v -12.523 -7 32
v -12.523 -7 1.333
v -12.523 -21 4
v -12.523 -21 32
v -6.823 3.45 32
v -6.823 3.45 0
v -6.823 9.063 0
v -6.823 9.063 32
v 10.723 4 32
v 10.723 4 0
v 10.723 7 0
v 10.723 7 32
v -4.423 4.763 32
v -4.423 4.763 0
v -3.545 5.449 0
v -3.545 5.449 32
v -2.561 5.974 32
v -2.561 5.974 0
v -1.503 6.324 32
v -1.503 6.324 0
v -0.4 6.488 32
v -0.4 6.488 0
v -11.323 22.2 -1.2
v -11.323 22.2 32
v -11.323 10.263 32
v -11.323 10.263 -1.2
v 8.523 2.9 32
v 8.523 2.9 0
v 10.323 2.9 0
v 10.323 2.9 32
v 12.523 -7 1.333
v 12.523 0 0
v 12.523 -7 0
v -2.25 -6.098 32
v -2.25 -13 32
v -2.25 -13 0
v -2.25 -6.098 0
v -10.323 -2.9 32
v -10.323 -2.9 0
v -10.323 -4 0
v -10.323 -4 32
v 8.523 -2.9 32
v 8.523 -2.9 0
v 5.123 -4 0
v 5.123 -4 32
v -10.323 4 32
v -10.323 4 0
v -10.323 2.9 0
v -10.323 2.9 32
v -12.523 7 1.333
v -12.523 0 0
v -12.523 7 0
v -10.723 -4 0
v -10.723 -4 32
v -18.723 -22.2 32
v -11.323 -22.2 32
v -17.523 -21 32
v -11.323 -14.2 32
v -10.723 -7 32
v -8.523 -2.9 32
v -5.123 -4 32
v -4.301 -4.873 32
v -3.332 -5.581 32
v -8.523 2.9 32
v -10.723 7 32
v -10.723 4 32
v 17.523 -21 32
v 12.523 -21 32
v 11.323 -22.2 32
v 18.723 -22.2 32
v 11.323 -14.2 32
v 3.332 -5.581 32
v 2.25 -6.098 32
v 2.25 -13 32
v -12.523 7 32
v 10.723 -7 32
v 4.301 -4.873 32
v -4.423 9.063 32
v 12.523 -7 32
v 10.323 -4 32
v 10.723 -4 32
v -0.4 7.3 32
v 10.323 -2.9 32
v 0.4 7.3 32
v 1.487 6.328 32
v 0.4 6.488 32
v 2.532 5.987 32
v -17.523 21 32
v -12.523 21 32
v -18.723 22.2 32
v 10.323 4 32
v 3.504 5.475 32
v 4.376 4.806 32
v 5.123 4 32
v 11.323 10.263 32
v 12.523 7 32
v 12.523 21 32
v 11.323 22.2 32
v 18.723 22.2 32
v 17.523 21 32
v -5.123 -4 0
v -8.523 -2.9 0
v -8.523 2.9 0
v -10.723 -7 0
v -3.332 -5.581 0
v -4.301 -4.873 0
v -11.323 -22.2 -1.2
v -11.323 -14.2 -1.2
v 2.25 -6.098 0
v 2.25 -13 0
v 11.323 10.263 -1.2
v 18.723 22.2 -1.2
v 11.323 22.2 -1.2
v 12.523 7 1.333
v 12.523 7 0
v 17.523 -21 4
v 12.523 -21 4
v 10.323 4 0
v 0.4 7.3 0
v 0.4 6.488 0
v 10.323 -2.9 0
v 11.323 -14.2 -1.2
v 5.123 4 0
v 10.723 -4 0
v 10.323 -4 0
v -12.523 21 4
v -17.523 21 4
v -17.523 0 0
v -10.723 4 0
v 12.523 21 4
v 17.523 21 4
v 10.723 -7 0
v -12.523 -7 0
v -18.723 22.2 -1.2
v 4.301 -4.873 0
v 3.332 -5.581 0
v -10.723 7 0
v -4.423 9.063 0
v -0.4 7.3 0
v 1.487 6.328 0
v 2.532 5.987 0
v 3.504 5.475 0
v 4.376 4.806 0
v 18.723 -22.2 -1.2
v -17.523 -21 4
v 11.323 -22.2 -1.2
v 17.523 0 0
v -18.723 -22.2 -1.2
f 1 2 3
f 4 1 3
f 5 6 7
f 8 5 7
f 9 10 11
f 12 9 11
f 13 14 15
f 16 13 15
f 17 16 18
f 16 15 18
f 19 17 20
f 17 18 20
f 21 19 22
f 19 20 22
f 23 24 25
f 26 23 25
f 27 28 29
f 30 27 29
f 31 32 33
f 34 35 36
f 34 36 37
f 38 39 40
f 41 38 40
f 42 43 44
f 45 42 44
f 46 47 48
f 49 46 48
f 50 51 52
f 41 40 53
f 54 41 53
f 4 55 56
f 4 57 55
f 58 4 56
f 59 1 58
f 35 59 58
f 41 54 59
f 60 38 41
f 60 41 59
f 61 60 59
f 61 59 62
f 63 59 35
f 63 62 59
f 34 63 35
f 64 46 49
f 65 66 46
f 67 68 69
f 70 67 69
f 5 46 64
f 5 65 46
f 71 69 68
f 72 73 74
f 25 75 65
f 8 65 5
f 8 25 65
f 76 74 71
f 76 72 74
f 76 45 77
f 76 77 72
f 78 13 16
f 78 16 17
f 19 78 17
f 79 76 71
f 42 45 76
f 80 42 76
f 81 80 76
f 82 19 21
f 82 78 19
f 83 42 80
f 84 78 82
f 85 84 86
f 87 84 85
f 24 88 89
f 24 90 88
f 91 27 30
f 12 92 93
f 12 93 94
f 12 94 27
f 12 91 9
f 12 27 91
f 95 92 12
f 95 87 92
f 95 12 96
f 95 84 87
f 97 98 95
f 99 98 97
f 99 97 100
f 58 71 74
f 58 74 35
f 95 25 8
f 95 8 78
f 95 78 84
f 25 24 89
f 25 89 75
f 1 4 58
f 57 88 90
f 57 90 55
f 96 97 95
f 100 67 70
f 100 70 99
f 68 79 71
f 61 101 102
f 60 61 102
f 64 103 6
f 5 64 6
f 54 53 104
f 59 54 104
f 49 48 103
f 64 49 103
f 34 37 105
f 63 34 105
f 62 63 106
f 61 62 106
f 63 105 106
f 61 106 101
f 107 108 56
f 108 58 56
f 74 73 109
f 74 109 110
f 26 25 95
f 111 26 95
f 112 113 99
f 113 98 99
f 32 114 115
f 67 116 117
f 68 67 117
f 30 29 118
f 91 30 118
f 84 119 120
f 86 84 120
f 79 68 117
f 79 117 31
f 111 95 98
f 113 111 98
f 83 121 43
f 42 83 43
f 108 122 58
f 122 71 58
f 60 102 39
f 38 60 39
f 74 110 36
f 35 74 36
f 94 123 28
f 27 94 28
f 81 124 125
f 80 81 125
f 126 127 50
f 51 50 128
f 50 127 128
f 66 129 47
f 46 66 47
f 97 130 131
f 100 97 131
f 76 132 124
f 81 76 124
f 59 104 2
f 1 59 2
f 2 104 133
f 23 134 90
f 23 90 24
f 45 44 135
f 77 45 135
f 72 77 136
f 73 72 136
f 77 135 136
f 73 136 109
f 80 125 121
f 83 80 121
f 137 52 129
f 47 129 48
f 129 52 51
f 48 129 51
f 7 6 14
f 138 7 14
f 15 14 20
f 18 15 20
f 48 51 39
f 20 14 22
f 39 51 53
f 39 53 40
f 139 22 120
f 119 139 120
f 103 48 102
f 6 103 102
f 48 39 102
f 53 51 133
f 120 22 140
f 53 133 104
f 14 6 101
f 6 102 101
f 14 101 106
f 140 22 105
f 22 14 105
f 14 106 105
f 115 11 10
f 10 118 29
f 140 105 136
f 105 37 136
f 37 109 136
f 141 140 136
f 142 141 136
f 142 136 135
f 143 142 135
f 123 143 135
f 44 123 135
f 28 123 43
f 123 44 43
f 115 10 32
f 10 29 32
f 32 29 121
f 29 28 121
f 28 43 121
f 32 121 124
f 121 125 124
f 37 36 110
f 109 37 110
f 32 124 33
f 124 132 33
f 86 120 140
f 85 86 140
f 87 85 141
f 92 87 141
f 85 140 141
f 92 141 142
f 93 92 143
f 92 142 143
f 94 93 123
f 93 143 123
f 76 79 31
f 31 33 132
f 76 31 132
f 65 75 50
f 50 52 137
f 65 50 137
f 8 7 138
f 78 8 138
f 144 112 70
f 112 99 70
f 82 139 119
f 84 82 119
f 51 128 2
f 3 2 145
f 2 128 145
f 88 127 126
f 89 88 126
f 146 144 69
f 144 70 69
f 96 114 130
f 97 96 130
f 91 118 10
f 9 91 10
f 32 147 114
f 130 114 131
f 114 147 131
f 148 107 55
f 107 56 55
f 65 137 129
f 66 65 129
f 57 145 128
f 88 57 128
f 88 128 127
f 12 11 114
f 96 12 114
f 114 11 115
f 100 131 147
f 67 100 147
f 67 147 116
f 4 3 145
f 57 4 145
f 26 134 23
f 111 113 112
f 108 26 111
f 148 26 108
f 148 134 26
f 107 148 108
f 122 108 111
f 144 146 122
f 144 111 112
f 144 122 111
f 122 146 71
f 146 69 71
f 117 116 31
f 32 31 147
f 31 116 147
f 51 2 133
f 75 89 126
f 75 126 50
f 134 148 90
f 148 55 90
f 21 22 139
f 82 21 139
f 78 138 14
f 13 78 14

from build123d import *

# Parameters (mm, degrees)
F1_DEPTH = 32
F3_DEPTH = 1.2
F7_DEPTH = 5
F8_DEPTH = 5


with BuildPart() as f1:
    # F0 (on Top) → F1 (new body)
    with BuildSketch(Plane.XY):
        Polygon((-18.723475383, -22.2), (-11.323475383, -22.2), (-11.323475383, -14.2), (-2.25, -14.2), (2.25, -14.2), (11.323475383, -14.2), (11.323475383, -22.2), (18.723475383, -22.2), (18.723475383, 0), (18.723475383, 22.2), (11.323475383, 22.2), (11.323475383, 10.2626532034), (-4.423475383, 10.2626532034), (-6.823475383, 10.2626532034), (-11.323475383, 10.2626532034), (-11.323475383, 22.2), (-18.723475383, 22.2), (-18.723475383, 0), align=None)
        with BuildLine():
            ThreePointArc((-2.25, -6.0981554588), (-3.833092601, -5.2495143691), (-5.123475383, -4))
            Line((-5.123475383, -4), (-8.523475383, -2.9))
            Line((-8.523475383, -2.9), (-10.323475383, -2.9))
            Line((-10.323475383, -2.9), (-10.323475383, -4))
            Line((-10.323475383, -4), (-10.723475383, -4))
            Line((-10.723475383, -4), (-10.723475383, -7))
            Line((-10.723475383, -7), (-12.523475383, -7))
            Line((-12.523475383, -7), (-12.523475383, -21))
            Line((-12.523475383, -21), (-17.523475383, -21))
            Line((-17.523475383, -21), (-17.523475383, 0))
            Line((-17.523475383, 0), (-17.523475383, 21))
            Line((-17.523475383, 21), (-12.523475383, 21))
            Line((-12.523475383, 21), (-12.523475383, 7))
            Line((-12.523475383, 7), (-10.723475383, 7))
            Line((-10.723475383, 7), (-10.723475383, 4))
            Line((-10.723475383, 4), (-10.323475383, 4))
            Line((-10.323475383, 4), (-10.323475383, 2.9))
            Line((-10.323475383, 2.9), (-8.523475383, 2.9))
            Line((-8.523475383, 2.9), (-6.823475383, 3.45))
            Line((-6.823475383, 3.45), (-6.823475383, 9.0626532034))
            Line((-6.823475383, 9.0626532034), (-4.423475383, 9.0626532034))
            Line((-4.423475383, 9.0626532034), (-4.423475383, 4.7626532034))
            ThreePointArc((-4.423475383, 4.7626532034), (-2.5613294597, 5.9740766148), (-0.4, 6.4876806333))
            Line((-0.4, 6.4876806333), (-0.4, 7.3))
            Line((-0.4, 7.3), (0, 7.3))
            Line((0, 7.3), (0.4, 7.3))
            Line((0.4, 7.3), (0.4, 6.4876806333))
            ThreePointArc((0.4, 6.4876806333), (3.0289162765, 5.7511447721), (5.123475383, 4))
            Line((5.123475383, 4), (8.523475383, 2.9))
            Line((8.523475383, 2.9), (10.323475383, 2.9))
            Line((10.323475383, 2.9), (10.323475383, 4))
            Line((10.323475383, 4), (10.723475383, 4))
            Line((10.723475383, 4), (10.723475383, 7))
            Line((10.723475383, 7), (12.523475383, 7))
            Line((12.523475383, 7), (12.523475383, 21))
            Line((12.523475383, 21), (17.523475383, 21))
            Line((17.523475383, 21), (17.523475383, 0))
            Line((17.523475383, 0), (17.523475383, -21))
            Line((17.523475383, -21), (12.523475383, -21))
            Line((12.523475383, -21), (12.523475383, -7))
            Line((12.523475383, -7), (10.723475383, -7))
            Line((10.723475383, -7), (10.723475383, -4))
            Line((10.723475383, -4), (10.323475383, -4))
            Line((10.323475383, -4), (10.323475383, -2.9))
            Line((10.323475383, -2.9), (8.523475383, -2.9))
            Line((8.523475383, -2.9), (5.123475383, -4))
            ThreePointArc((5.123475383, -4), (3.833092601, -5.2495143691), (2.25, -6.0981554588))
            Line((2.25, -6.0981554588), (2.25, -13))
            Line((2.25, -13), (-2.25, -13))
            Line((-2.25, -13), (-2.25, -6.0981554588))
        make_face(mode=Mode.SUBTRACT)
    extrude(amount=F1_DEPTH)

    # F2 (on face) → F3 (join)
    with BuildSketch(Plane(origin=(0, 0, 0), x_dir=(1, 0, 0), z_dir=(0, 0, -1))):
        Polygon((11.323475383, -10.2626532034), (11.323475383, -22.2), (18.723475383, -22.2), (18.723475383, 0), (18.723475383, 22.2), (11.323475383, 22.2), (11.323475383, 14.2), (-11.323475383, 14.2), (-11.323475383, 22.2), (-18.723475383, 22.2), (-18.723475383, -22.2), (-11.323475383, -22.2), (-11.323475383, -10.2626532034), align=None)
        with BuildLine():
            Line((17.523475383, 21), (17.523475383, 0))
            Line((17.523475383, 0), (17.523475383, -21))
            Line((17.523475383, -21), (12.523475383, -21))
            Line((12.523475383, -21), (12.523475383, -7))
            Line((12.523475383, -7), (10.723475383, -7))
            Line((10.723475383, -7), (10.723475383, -4))
            Line((10.723475383, -4), (10.323475383, -4))
            Line((10.323475383, -4), (10.323475383, -2.9))
            Line((10.323475383, -2.9), (8.523475383, -2.9))
            Line((8.523475383, -2.9), (5.123475383, -4))
            ThreePointArc((5.123475383, -4), (3.0289162765, -5.7511447721), (0.4, -6.4876806333))
            Line((0.4, -6.4876806333), (0.4, -7.3))
            Line((0.4, -7.3), (-0.4, -7.3))
            Line((-0.4, -7.3), (-0.4, -6.4876806333))
            ThreePointArc((-0.4, -6.4876806333), (-2.5613294597, -5.9740766148), (-4.423475383, -4.7626532034))
            Line((-4.423475383, -4.7626532034), (-4.423475383, -9.0626532034))
            Line((-4.423475383, -9.0626532034), (-6.823475383, -9.0626532034))
            Line((-6.823475383, -9.0626532034), (-6.823475383, -3.45))
            Line((-6.823475383, -3.45), (-8.523475383, -2.9))
            Line((-8.523475383, -2.9), (-10.323475383, -2.9))
            Line((-10.323475383, -2.9), (-10.323475383, -4))
            Line((-10.323475383, -4), (-10.723475383, -4))
            Line((-10.723475383, -4), (-10.723475383, -7))
            Line((-10.723475383, -7), (-12.523475383, -7))
            Line((-12.523475383, -7), (-12.523475383, -21))
            Line((-12.523475383, -21), (-17.523475383, -21))
            Line((-17.523475383, -21), (-17.523475383, 0))
            Line((-17.523475383, 0), (-17.523475383, 21))
            Line((-17.523475383, 21), (-12.523475383, 21))
            Line((-12.523475383, 21), (-12.523475383, 7))
            Line((-12.523475383, 7), (-10.723475383, 7))
            Line((-10.723475383, 7), (-10.723475383, 4))
            Line((-10.723475383, 4), (-10.323475383, 4))
            Line((-10.323475383, 4), (-10.323475383, 2.9))
            Line((-10.323475383, 2.9), (-8.523475383, 2.9))
            Line((-8.523475383, 2.9), (-5.123475383, 4))
            ThreePointArc((-5.123475383, 4), (-3.833092601, 5.2495143691), (-2.25, 6.0981554588))
            Line((-2.25, 6.0981554588), (-2.25, 13))
            Line((-2.25, 13), (2.25, 13))
            Line((2.25, 13), (2.25, 6.0981554588))
            ThreePointArc((2.25, 6.0981554588), (3.833092601, 5.2495143691), (5.123475383, 4))
            Line((5.123475383, 4), (8.523475383, 2.9))
            Line((8.523475383, 2.9), (10.323475383, 2.9))
            Line((10.323475383, 2.9), (10.323475383, 4))
            Line((10.323475383, 4), (10.723475383, 4))
            Line((10.723475383, 4), (10.723475383, 7))
            Line((10.723475383, 7), (12.523475383, 7))
            Line((12.523475383, 7), (12.523475383, 21))
            Line((12.523475383, 21), (17.523475383, 21))
        make_face(mode=Mode.SUBTRACT)
        with BuildLine():
            Line((17.523475383, -21), (17.523475383, 0))
            Line((17.523475383, 0), (-17.523475383, 0))
            Line((-17.523475383, 0), (-17.523475383, -21))
            Line((-17.523475383, -21), (-12.523475383, -21))
            Line((-12.523475383, -21), (-12.523475383, -7))
            Line((-12.523475383, -7), (-10.723475383, -7))
            Line((-10.723475383, -7), (-10.723475383, -4))
            Line((-10.723475383, -4), (-10.323475383, -4))
            Line((-10.323475383, -4), (-10.323475383, -2.9))
            Line((-10.323475383, -2.9), (-8.523475383, -2.9))
            Line((-8.523475383, -2.9), (-6.823475383, -3.45))
            Line((-6.823475383, -3.45), (-6.823475383, -9.0626532034))
            Line((-6.823475383, -9.0626532034), (-4.423475383, -9.0626532034))
            Line((-4.423475383, -9.0626532034), (-4.423475383, -4.7626532034))
            ThreePointArc((-4.423475383, -4.7626532034), (-2.5613294597, -5.9740766148), (-0.4, -6.4876806333))
            Line((-0.4, -6.4876806333), (-0.4, -7.3))
            Line((-0.4, -7.3), (0.4, -7.3))
            Line((0.4, -7.3), (0.4, -6.4876806333))
            ThreePointArc((0.4, -6.4876806333), (3.0289162765, -5.7511447721), (5.123475383, -4))
            Line((5.123475383, -4), (8.523475383, -2.9))
            Line((8.523475383, -2.9), (10.323475383, -2.9))
            Line((10.323475383, -2.9), (10.323475383, -4))
            Line((10.323475383, -4), (10.723475383, -4))
            Line((10.723475383, -4), (10.723475383, -7))
            Line((10.723475383, -7), (12.523475383, -7))
            Line((12.523475383, -7), (12.523475383, -21))
            Line((12.523475383, -21), (17.523475383, -21))
        make_face()
        with BuildLine():
            Line((-17.523475383, 0), (17.523475383, 0))
            Line((17.523475383, 0), (17.523475383, 21))
            Line((17.523475383, 21), (12.523475383, 21))
            Line((12.523475383, 21), (12.523475383, 7))
            Line((12.523475383, 7), (10.723475383, 7))
            Line((10.723475383, 7), (10.723475383, 4))
            Line((10.723475383, 4), (10.323475383, 4))
            Line((10.323475383, 4), (10.323475383, 2.9))
            Line((10.323475383, 2.9), (8.523475383, 2.9))
            Line((8.523475383, 2.9), (5.123475383, 4))
            ThreePointArc((5.123475383, 4), (3.833092601, 5.2495143691), (2.25, 6.0981554588))
            Line((2.25, 6.0981554588), (2.25, 13))
            Line((2.25, 13), (-2.25, 13))
            Line((-2.25, 13), (-2.25, 6.0981554588))
            ThreePointArc((-2.25, 6.0981554588), (-3.833092601, 5.2495143691), (-5.123475383, 4))
            Line((-5.123475383, 4), (-8.523475383, 2.9))
            Line((-8.523475383, 2.9), (-10.323475383, 2.9))
            Line((-10.323475383, 2.9), (-10.323475383, 4))
            Line((-10.323475383, 4), (-10.723475383, 4))
            Line((-10.723475383, 4), (-10.723475383, 7))
            Line((-10.723475383, 7), (-12.523475383, 7))
            Line((-12.523475383, 7), (-12.523475383, 21))
            Line((-12.523475383, 21), (-17.523475383, 21))
            Line((-17.523475383, 21), (-17.523475383, 0))
        make_face()
    extrude(amount=F3_DEPTH)

    # F5 (on face) → F7 (join, through all)
    with BuildSketch(Plane.YZ.offset(-17.523475383)):
        Polygon((-21, 4), (-21, 0), (0, 0), align=None)
        Polygon((21, 4), (0, 0), (21, 0), align=None)
    extrude(amount=F7_DEPTH)

    # F6 (on face) → F8 (join, through all)
    with BuildSketch(Plane(origin=(17.523475383, 0, 0), x_dir=(0, -1, 0), z_dir=(-1, 0, 0))):
        Polygon((-21, 4), (-21, 0), (0, 0), align=None)
        Polygon((21, 4), (0, 0), (21, 0), align=None)
    extrude(amount=F8_DEPTH)


solid = f1.part
